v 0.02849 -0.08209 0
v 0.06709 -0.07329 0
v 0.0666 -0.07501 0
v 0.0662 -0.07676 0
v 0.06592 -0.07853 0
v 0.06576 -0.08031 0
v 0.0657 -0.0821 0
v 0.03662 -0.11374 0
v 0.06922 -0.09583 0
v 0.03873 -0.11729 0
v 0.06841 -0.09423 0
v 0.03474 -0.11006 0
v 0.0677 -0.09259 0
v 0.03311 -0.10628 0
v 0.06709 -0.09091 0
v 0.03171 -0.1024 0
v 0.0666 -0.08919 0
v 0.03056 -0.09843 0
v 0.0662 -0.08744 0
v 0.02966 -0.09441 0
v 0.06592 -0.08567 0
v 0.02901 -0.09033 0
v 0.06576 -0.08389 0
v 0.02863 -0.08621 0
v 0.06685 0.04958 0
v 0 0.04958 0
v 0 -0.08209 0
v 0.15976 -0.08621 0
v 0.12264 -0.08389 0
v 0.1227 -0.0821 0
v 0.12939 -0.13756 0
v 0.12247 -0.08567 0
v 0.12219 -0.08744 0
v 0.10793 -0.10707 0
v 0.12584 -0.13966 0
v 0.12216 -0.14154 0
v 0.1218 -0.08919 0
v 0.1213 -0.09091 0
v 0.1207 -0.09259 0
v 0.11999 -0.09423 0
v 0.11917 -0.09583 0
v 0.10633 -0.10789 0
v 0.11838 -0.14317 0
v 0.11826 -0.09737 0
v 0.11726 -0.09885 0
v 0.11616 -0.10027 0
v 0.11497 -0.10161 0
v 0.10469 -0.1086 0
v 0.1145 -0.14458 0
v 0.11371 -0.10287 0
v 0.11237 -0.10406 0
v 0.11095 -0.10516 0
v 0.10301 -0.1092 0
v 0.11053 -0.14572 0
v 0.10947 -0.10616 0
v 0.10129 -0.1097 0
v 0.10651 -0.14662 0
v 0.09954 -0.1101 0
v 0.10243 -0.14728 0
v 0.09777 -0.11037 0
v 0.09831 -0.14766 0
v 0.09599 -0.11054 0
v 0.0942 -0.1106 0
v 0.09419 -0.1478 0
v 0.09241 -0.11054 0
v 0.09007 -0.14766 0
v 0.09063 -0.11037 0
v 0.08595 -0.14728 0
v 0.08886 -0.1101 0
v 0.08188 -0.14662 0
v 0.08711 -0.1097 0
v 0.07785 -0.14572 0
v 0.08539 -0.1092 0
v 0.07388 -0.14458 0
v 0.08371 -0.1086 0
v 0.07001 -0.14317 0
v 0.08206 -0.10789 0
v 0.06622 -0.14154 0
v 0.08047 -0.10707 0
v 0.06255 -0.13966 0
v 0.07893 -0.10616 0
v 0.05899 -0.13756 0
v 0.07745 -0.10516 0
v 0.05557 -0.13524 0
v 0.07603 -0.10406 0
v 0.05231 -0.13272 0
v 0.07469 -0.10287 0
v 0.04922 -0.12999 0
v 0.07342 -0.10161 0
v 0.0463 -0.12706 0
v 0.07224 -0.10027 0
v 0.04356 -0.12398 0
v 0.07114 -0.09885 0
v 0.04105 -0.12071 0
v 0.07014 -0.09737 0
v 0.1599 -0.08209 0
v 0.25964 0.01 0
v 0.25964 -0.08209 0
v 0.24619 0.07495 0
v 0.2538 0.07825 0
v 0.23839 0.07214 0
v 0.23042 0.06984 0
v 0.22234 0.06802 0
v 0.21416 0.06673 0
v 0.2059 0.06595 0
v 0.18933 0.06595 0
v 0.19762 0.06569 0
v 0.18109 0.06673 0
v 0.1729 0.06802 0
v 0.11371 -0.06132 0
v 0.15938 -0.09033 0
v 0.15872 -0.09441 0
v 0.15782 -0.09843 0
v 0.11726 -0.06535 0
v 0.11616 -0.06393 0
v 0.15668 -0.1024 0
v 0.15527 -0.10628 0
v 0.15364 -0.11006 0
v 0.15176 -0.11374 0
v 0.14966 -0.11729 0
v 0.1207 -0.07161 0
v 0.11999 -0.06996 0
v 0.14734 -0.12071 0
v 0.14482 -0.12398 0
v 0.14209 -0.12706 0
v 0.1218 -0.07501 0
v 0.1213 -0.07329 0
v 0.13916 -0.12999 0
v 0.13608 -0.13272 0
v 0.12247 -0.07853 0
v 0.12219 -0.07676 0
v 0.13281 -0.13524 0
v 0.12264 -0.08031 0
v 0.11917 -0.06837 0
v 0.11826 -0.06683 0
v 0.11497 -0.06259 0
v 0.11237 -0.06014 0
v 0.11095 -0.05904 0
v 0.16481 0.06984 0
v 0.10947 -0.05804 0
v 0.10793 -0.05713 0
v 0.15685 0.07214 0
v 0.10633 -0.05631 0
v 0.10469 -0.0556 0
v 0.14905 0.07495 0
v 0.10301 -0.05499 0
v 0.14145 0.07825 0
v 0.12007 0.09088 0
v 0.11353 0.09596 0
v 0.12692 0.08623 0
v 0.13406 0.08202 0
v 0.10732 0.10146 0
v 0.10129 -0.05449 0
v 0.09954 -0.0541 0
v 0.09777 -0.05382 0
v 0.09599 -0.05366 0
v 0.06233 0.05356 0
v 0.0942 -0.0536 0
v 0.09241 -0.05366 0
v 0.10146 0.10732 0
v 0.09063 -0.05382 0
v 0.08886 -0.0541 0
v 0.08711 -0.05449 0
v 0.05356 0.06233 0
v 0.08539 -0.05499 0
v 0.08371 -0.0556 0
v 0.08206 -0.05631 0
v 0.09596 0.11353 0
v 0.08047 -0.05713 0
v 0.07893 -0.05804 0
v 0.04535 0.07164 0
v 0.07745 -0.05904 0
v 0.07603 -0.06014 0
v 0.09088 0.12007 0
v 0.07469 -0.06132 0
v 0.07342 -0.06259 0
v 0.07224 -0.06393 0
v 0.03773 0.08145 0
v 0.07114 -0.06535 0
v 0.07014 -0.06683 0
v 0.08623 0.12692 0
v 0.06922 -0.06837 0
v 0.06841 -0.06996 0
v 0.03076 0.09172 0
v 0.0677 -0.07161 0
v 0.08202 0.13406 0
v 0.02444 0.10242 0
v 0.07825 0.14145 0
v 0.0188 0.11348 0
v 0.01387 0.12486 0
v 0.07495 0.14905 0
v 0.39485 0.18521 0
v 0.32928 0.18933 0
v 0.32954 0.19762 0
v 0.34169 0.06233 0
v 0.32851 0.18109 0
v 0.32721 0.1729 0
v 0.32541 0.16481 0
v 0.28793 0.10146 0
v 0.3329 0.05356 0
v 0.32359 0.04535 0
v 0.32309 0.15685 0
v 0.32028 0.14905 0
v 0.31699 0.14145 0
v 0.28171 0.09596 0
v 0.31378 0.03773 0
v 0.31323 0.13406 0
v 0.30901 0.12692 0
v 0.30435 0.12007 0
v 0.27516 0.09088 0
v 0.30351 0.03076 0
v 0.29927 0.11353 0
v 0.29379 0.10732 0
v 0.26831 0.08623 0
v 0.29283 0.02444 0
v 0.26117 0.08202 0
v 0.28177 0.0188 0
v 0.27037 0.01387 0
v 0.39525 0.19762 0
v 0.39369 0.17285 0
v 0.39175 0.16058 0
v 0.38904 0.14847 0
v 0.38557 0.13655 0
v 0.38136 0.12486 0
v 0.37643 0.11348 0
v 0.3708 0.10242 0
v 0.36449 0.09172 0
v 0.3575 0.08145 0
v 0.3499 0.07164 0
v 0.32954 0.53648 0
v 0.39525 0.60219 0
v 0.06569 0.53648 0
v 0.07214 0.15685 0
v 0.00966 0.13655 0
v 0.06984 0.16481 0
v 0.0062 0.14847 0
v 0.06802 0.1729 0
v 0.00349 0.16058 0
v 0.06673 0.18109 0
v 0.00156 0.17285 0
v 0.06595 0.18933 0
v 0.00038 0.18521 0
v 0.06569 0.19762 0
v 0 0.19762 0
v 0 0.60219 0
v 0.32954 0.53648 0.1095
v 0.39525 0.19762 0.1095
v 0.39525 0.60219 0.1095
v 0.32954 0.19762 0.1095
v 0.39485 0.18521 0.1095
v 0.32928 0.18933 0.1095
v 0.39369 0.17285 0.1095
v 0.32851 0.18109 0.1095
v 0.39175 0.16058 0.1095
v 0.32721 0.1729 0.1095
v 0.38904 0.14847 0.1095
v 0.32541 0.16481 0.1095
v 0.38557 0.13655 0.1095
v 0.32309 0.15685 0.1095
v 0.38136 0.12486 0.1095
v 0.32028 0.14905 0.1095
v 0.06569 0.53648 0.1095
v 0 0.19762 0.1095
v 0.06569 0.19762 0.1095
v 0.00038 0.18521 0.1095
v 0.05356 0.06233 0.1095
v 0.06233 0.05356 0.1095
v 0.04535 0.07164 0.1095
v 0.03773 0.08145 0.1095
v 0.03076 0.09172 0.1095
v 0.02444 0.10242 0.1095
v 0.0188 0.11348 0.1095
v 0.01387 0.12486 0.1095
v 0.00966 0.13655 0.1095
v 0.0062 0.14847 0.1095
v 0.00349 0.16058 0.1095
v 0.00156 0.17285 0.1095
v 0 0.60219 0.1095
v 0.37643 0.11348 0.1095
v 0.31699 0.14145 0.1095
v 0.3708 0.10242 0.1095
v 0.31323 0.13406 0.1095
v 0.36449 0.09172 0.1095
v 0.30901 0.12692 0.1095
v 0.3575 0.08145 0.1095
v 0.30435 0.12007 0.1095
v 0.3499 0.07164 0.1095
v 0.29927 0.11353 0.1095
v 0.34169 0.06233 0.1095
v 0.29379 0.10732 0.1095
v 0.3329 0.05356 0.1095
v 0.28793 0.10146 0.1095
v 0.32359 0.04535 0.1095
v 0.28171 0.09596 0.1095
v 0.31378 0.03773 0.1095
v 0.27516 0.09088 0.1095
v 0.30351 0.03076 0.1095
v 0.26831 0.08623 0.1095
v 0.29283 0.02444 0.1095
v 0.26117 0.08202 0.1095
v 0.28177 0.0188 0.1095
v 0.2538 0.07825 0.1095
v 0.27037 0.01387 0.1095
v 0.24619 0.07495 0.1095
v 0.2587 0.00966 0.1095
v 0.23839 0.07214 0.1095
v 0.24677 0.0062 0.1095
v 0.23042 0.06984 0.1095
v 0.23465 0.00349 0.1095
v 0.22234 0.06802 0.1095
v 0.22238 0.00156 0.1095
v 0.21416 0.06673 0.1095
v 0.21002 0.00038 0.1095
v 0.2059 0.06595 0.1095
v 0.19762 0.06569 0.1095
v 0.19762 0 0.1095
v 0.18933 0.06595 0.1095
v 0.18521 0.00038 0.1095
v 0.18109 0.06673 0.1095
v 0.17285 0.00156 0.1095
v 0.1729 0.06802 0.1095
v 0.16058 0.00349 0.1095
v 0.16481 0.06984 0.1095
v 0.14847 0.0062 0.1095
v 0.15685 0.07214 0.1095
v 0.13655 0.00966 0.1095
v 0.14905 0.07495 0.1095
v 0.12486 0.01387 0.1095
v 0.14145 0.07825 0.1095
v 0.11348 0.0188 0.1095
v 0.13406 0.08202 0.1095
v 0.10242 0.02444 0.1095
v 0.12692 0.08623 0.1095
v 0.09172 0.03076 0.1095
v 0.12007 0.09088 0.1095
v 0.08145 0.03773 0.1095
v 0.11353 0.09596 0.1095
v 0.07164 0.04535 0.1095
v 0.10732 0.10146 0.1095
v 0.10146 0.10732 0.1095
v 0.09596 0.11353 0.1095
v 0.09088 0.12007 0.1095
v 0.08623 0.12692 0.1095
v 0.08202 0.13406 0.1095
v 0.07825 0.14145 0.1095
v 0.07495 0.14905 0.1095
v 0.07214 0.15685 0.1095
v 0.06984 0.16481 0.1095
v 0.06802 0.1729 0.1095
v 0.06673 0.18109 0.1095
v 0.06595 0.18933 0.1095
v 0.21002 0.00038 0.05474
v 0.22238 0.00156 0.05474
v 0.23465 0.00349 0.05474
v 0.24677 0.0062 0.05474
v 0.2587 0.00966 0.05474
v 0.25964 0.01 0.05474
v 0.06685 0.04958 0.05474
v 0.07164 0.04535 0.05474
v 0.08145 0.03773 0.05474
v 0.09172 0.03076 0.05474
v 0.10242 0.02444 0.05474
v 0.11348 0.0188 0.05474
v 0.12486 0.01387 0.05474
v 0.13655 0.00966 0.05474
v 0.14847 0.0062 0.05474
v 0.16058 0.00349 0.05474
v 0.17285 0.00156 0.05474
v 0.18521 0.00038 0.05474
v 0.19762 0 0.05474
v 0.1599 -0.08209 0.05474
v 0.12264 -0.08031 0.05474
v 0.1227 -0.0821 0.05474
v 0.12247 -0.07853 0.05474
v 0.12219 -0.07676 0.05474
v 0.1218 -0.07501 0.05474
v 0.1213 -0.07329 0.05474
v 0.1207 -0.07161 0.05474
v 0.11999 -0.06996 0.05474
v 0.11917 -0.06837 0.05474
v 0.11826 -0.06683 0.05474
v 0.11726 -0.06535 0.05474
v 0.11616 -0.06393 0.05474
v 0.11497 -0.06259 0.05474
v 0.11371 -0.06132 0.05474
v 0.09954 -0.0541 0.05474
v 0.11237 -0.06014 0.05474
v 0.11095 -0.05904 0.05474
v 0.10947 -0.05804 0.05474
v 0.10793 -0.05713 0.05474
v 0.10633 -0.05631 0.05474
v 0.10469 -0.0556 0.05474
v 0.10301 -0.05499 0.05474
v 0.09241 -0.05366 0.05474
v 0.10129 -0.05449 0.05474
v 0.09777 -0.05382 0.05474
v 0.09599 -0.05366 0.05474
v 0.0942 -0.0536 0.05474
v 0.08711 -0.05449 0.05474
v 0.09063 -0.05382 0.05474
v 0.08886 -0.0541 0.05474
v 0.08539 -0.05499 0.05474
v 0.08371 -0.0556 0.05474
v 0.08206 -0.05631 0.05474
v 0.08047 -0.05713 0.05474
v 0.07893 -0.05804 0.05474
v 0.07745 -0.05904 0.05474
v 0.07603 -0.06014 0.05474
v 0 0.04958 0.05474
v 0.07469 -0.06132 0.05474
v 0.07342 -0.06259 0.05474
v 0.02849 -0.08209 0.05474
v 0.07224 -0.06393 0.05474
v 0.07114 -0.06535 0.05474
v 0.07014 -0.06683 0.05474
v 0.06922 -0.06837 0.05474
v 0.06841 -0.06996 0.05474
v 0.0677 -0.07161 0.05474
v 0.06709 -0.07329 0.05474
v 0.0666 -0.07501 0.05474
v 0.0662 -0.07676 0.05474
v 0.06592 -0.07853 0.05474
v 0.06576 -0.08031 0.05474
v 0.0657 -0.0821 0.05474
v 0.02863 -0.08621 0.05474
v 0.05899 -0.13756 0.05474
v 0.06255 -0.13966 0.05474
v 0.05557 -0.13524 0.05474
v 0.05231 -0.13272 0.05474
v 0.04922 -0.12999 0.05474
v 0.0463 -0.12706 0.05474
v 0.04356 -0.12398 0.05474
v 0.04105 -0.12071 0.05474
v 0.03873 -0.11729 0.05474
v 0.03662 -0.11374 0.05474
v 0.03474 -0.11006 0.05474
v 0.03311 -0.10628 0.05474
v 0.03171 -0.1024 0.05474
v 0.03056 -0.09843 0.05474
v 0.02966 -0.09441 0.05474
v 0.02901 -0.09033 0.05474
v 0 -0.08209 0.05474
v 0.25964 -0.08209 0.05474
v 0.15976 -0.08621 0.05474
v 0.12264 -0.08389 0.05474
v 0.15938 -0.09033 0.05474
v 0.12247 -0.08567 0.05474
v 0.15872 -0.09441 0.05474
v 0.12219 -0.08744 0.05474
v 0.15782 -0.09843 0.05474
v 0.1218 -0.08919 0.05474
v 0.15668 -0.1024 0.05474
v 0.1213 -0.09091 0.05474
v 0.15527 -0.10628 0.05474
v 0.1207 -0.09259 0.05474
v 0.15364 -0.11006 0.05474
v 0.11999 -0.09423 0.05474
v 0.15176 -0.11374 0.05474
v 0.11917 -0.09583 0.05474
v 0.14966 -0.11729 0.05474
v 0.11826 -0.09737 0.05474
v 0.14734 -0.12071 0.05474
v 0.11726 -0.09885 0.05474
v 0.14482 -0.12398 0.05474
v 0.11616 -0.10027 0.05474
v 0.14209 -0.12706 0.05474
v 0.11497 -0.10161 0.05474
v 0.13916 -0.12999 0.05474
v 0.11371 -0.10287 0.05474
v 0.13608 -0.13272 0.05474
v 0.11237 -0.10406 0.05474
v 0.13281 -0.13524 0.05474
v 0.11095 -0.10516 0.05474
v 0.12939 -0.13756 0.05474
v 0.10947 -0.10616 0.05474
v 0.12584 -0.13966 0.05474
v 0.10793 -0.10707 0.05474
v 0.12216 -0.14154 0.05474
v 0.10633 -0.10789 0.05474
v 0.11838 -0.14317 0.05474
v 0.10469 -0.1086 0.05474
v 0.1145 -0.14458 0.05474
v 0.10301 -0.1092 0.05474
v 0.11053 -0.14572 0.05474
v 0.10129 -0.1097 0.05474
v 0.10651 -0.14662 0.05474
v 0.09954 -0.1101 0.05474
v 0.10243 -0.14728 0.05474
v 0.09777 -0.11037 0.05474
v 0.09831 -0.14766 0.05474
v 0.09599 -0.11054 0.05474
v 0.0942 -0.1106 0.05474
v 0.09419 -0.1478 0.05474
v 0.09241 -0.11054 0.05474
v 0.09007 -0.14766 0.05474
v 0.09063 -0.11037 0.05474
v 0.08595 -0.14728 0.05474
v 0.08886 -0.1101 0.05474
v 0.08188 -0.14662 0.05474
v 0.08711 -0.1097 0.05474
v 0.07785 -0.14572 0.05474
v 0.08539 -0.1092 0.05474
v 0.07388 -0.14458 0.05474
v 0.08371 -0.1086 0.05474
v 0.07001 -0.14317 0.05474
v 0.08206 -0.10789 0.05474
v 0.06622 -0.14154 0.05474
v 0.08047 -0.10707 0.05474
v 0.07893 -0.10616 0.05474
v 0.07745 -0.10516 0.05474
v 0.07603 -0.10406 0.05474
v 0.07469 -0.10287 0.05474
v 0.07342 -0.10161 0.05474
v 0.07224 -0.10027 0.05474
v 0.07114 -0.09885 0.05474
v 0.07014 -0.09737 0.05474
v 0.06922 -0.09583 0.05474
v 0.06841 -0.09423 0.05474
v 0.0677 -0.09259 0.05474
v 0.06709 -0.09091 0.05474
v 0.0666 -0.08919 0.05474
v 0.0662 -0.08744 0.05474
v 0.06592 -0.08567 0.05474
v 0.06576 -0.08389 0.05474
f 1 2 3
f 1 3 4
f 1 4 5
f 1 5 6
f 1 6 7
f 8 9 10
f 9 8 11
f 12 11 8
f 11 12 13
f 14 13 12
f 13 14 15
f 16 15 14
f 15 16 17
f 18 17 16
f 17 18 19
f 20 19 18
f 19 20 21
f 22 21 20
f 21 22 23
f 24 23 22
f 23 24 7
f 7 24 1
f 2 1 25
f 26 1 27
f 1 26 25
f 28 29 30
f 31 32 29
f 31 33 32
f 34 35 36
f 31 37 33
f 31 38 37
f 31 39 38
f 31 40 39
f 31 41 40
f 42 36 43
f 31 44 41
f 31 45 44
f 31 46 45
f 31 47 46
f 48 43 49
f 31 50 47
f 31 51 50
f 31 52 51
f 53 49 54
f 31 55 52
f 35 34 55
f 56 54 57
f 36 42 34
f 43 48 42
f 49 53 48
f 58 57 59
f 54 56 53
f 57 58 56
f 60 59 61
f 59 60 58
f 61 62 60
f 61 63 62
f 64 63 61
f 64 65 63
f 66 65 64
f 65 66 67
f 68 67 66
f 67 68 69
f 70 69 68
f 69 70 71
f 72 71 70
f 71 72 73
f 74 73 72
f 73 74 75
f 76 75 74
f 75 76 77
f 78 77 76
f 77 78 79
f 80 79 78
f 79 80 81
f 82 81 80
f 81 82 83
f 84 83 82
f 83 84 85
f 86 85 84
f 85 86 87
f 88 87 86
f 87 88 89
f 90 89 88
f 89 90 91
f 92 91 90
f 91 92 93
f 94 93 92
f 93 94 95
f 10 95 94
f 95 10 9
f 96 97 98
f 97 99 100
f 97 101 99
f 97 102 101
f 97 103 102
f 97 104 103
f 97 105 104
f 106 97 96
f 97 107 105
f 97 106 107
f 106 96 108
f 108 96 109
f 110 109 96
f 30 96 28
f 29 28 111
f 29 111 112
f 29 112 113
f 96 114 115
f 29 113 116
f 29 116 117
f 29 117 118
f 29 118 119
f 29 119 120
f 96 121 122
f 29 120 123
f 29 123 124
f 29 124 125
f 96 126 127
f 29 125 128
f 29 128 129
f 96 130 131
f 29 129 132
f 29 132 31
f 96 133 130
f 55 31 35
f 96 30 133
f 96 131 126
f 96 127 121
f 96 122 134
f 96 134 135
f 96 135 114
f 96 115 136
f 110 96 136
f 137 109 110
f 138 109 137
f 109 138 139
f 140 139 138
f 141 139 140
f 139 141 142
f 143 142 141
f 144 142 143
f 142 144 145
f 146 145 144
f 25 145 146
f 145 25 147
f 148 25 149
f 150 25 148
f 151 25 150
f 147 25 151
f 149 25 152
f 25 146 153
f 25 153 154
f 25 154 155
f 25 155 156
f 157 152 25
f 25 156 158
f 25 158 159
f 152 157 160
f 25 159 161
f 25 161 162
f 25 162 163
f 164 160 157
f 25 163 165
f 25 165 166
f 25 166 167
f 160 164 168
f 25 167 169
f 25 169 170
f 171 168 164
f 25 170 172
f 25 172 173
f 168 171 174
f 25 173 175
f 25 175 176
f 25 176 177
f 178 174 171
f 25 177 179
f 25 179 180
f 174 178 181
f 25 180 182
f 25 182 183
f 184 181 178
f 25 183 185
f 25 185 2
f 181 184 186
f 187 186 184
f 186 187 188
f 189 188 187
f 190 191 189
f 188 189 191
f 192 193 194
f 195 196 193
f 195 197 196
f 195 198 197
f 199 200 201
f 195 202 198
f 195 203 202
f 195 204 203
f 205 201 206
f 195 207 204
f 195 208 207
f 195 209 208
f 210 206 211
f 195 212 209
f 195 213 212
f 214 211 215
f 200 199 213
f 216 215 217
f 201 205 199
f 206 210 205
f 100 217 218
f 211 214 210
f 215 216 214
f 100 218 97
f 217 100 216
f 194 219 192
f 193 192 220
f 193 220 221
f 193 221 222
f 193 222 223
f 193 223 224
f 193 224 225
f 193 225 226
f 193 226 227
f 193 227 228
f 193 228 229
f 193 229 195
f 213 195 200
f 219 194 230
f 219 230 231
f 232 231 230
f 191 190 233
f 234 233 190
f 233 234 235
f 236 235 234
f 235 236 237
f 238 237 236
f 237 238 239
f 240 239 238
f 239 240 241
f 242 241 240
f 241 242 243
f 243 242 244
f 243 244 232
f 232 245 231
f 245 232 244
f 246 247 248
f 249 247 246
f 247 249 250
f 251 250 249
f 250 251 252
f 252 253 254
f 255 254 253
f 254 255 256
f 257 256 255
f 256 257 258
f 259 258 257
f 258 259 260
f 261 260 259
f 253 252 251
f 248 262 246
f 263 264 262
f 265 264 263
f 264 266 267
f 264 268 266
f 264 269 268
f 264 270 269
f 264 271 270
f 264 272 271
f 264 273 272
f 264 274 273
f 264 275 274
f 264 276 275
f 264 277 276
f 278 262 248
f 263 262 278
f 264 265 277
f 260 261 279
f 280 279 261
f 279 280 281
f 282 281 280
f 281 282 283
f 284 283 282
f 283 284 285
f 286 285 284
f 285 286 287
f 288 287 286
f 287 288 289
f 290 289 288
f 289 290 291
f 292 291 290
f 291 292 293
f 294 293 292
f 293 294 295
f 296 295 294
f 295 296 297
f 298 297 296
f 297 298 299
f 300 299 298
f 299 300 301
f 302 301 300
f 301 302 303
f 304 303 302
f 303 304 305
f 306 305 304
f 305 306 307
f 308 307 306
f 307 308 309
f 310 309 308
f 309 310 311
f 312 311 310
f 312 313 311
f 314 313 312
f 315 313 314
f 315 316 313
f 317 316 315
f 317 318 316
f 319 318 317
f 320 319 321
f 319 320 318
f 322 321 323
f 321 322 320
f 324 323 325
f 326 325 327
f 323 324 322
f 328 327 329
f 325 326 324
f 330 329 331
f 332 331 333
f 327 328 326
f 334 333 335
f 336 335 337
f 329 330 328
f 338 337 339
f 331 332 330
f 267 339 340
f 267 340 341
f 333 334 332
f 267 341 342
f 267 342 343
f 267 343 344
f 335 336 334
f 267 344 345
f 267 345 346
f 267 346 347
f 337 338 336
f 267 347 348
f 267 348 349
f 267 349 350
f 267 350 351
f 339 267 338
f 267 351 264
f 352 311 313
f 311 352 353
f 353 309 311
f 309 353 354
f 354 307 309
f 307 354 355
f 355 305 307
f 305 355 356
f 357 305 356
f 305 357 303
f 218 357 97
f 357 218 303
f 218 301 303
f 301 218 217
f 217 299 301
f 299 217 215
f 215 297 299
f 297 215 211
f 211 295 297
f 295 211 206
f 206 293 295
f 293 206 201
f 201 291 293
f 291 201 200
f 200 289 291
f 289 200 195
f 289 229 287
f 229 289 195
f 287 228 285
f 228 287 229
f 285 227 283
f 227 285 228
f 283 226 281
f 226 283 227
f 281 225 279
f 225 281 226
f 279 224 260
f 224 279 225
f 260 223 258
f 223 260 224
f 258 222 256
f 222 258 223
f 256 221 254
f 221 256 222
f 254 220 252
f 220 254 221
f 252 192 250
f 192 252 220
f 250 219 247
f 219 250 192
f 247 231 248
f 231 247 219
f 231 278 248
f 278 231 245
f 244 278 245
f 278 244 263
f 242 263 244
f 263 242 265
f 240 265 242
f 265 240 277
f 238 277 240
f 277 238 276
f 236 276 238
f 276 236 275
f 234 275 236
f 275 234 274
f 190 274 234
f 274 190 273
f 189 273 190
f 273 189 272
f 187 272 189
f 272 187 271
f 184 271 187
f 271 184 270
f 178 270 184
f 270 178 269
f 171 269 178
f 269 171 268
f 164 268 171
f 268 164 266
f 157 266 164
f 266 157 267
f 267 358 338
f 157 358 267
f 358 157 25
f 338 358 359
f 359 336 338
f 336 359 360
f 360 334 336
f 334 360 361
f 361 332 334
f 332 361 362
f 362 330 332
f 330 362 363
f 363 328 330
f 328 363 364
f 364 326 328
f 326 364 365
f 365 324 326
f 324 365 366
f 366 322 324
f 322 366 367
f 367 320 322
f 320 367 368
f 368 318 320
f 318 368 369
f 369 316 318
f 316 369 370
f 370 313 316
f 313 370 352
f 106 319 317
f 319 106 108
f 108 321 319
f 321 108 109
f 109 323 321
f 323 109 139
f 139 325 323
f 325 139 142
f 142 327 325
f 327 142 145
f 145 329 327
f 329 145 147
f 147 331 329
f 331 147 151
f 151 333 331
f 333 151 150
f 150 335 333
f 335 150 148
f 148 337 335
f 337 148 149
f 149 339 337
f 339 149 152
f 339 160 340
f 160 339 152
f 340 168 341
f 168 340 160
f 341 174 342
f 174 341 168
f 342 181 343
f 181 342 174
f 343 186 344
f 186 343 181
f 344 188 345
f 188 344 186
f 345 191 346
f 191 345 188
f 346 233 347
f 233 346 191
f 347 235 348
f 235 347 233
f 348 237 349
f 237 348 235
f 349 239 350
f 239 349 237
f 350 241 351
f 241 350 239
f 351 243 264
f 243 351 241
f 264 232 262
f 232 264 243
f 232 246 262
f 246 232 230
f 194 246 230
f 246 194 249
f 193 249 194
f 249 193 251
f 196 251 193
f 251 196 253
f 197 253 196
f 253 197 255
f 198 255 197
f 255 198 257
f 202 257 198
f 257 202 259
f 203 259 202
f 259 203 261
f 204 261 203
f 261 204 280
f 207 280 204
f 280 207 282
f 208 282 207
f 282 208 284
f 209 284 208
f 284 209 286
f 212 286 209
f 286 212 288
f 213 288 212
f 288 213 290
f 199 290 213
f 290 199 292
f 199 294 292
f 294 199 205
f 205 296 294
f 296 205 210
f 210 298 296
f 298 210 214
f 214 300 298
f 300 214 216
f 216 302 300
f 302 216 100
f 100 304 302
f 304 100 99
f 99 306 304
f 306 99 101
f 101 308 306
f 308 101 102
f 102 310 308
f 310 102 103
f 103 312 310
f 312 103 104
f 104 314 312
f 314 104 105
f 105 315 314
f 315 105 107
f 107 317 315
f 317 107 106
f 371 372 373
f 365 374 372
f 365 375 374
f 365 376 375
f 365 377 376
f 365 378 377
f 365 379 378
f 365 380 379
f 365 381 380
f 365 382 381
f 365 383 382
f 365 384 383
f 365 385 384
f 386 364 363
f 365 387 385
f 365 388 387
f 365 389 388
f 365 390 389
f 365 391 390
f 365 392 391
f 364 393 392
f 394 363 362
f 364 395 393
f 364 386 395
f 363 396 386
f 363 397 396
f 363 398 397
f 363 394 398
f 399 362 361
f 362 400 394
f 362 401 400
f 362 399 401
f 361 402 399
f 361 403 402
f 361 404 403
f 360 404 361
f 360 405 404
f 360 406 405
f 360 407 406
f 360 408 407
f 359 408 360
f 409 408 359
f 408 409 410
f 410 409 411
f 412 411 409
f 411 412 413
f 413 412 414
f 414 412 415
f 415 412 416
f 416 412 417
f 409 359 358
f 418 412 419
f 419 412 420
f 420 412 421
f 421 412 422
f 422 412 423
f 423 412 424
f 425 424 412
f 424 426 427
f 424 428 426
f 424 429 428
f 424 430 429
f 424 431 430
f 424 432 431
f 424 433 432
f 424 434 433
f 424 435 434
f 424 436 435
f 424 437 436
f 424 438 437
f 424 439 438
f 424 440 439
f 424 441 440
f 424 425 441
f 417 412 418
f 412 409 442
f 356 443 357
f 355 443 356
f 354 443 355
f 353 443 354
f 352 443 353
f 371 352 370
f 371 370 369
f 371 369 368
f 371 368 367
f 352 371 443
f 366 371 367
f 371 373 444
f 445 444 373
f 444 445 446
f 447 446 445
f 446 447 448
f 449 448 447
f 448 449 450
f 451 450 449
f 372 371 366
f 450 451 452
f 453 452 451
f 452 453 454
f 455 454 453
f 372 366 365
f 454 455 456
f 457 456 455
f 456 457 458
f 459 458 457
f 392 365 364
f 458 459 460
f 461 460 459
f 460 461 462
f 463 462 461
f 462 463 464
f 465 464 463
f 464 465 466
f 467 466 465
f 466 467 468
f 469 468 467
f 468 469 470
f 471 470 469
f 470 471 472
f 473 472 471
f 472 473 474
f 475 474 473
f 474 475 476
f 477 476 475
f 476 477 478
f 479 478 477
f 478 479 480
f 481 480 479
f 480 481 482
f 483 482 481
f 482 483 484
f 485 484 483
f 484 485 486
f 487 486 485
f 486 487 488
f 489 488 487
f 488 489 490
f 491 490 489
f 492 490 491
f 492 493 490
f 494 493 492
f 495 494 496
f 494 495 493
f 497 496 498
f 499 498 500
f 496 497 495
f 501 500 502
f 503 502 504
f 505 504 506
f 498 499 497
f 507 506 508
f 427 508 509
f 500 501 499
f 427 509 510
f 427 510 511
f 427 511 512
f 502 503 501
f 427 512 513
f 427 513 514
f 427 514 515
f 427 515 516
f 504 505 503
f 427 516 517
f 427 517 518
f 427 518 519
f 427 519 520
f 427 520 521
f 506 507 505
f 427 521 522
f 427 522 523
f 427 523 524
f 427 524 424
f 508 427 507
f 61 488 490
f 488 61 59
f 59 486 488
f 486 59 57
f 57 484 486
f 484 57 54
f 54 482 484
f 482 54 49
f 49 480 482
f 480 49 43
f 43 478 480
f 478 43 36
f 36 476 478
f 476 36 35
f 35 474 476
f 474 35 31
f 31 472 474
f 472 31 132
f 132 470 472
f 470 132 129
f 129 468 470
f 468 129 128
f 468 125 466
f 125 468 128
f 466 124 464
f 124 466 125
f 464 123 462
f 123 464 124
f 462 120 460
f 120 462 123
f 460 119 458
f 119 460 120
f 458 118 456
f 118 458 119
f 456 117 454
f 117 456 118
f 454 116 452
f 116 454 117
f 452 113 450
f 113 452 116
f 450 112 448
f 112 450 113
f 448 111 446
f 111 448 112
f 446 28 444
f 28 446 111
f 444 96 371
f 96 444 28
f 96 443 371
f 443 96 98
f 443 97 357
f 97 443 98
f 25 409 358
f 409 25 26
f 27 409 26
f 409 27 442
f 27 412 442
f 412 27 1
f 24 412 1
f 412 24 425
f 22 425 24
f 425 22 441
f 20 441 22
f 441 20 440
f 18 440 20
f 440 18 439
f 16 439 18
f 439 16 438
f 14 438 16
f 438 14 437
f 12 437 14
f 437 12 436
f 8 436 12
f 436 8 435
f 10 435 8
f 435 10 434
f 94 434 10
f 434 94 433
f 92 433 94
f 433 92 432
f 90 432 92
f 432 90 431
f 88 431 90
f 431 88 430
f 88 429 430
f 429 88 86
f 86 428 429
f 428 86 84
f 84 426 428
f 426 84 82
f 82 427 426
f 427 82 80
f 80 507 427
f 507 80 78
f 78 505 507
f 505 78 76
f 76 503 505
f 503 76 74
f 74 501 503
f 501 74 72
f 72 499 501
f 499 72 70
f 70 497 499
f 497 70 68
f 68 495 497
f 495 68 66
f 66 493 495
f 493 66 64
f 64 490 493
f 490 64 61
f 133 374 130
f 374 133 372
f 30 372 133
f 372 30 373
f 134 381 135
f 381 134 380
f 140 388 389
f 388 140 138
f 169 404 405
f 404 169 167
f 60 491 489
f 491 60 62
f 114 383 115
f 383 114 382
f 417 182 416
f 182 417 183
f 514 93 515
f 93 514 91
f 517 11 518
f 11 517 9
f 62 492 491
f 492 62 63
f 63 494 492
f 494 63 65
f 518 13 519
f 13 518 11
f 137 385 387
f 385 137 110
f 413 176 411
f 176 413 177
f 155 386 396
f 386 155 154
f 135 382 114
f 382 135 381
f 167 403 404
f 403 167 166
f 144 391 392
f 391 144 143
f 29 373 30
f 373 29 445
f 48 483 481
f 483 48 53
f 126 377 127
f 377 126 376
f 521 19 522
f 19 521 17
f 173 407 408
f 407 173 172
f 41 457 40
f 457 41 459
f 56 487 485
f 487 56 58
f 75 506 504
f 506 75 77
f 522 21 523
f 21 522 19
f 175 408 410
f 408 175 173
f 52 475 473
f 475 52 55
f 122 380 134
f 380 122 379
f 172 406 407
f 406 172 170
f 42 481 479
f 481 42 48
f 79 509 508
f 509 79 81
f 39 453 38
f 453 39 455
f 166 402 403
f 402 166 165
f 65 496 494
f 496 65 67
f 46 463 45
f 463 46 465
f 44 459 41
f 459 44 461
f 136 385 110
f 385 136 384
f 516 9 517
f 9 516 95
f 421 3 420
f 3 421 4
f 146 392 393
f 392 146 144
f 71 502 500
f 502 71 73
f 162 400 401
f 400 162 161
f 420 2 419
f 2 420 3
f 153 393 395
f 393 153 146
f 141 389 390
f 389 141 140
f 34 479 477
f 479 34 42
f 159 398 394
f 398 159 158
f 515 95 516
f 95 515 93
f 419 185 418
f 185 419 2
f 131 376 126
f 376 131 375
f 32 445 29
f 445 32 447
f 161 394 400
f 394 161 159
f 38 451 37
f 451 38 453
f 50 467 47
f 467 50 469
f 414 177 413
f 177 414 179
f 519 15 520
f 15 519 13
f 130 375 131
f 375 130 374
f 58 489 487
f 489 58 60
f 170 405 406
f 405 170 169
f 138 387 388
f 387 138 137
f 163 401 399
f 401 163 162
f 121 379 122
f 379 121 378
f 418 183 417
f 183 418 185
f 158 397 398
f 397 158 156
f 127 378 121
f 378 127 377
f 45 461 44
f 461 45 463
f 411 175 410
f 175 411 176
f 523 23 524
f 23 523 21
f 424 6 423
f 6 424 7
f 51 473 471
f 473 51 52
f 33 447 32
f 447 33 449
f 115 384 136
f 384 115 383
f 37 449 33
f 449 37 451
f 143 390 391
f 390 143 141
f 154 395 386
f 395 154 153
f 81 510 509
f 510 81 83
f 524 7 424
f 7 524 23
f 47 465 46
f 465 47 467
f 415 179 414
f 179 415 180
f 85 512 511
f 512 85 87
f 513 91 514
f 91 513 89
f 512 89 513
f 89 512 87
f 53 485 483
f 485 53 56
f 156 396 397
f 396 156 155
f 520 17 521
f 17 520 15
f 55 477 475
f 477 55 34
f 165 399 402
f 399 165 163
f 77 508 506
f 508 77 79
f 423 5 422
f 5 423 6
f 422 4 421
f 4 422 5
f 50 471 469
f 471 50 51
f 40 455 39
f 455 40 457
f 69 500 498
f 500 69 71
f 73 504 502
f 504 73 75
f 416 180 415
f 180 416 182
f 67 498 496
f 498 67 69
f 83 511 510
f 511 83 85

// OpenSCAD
// Parameters
$fn = 100;
eps = 0.0005;

// Main base reference
base_length = 0.395255;
base_width  = 0.602190;
base_height = 0.109489;
main_depth  = 0.109500;

// D-frame wall
frame_wall = 0.065700;

// Shallow round protrusion footprint
tab_length = 0.259658;
tab_width  = 0.197373;
tab_height = 0.054745;

tab_left_offset  = 0.000000;
tab_right_offset = 0.135600;
tab_front_offset = -0.147800;
tab_back_offset  = 0.552600;

// Coaxial round tab and through-hole
tab_axis_x = 0.094200;
tab_axis_y = -0.082100;
tab_outer_r = 0.065700;
tab_hole_r  = 0.028500;

// Derived coordinates
tab_x0 = tab_left_offset;
tab_x1 = base_length - tab_right_offset;
tab_y0 = tab_front_offset;
tab_y1 = base_width - tab_back_offset;

// 2D outer D profile: flat rear, straight sides, rounded front
module d_profile_2d(len, wid) {
    r = len / 2;
    union() {
        translate([0, r])
            square([len, wid - r]);
        translate([r, r])
            circle(r=r);
    }
}

// 2D D-shaped frame with one continuous through-opening
module d_frame_2d(len, wid, wall) {
    r = len / 2;
    difference() {
        d_profile_2d(len, wid);
        union() {
            translate([wall, r])
                square([len - 2*wall, wid - wall - r]);
            translate([r, r])
                circle(r=r - wall);
        }
    }
}

// Main full-depth D-frame solid
module main_frame() {
    linear_extrude(height=main_depth)
        d_frame_2d(base_length, base_width, frame_wall);
}

// Shallow added round protrusion and connector band
module shallow_tab_solid() {
    linear_extrude(height=tab_height)
        union() {
            translate([tab_axis_x, tab_axis_y])
                circle(r=tab_outer_r);
            translate([tab_x0, tab_axis_y])
                square([tab_x1 - tab_x0, tab_y1 - tab_axis_y]);
        }
}

// Final model
difference() {
    union() {
        main_frame();
        shallow_tab_solid();
    }

    // Concentric circular opening through shallow protrusion
    translate([tab_axis_x, tab_axis_y, -eps])
        cylinder(h=tab_height + 2*eps, r=tab_hole_r);
}
